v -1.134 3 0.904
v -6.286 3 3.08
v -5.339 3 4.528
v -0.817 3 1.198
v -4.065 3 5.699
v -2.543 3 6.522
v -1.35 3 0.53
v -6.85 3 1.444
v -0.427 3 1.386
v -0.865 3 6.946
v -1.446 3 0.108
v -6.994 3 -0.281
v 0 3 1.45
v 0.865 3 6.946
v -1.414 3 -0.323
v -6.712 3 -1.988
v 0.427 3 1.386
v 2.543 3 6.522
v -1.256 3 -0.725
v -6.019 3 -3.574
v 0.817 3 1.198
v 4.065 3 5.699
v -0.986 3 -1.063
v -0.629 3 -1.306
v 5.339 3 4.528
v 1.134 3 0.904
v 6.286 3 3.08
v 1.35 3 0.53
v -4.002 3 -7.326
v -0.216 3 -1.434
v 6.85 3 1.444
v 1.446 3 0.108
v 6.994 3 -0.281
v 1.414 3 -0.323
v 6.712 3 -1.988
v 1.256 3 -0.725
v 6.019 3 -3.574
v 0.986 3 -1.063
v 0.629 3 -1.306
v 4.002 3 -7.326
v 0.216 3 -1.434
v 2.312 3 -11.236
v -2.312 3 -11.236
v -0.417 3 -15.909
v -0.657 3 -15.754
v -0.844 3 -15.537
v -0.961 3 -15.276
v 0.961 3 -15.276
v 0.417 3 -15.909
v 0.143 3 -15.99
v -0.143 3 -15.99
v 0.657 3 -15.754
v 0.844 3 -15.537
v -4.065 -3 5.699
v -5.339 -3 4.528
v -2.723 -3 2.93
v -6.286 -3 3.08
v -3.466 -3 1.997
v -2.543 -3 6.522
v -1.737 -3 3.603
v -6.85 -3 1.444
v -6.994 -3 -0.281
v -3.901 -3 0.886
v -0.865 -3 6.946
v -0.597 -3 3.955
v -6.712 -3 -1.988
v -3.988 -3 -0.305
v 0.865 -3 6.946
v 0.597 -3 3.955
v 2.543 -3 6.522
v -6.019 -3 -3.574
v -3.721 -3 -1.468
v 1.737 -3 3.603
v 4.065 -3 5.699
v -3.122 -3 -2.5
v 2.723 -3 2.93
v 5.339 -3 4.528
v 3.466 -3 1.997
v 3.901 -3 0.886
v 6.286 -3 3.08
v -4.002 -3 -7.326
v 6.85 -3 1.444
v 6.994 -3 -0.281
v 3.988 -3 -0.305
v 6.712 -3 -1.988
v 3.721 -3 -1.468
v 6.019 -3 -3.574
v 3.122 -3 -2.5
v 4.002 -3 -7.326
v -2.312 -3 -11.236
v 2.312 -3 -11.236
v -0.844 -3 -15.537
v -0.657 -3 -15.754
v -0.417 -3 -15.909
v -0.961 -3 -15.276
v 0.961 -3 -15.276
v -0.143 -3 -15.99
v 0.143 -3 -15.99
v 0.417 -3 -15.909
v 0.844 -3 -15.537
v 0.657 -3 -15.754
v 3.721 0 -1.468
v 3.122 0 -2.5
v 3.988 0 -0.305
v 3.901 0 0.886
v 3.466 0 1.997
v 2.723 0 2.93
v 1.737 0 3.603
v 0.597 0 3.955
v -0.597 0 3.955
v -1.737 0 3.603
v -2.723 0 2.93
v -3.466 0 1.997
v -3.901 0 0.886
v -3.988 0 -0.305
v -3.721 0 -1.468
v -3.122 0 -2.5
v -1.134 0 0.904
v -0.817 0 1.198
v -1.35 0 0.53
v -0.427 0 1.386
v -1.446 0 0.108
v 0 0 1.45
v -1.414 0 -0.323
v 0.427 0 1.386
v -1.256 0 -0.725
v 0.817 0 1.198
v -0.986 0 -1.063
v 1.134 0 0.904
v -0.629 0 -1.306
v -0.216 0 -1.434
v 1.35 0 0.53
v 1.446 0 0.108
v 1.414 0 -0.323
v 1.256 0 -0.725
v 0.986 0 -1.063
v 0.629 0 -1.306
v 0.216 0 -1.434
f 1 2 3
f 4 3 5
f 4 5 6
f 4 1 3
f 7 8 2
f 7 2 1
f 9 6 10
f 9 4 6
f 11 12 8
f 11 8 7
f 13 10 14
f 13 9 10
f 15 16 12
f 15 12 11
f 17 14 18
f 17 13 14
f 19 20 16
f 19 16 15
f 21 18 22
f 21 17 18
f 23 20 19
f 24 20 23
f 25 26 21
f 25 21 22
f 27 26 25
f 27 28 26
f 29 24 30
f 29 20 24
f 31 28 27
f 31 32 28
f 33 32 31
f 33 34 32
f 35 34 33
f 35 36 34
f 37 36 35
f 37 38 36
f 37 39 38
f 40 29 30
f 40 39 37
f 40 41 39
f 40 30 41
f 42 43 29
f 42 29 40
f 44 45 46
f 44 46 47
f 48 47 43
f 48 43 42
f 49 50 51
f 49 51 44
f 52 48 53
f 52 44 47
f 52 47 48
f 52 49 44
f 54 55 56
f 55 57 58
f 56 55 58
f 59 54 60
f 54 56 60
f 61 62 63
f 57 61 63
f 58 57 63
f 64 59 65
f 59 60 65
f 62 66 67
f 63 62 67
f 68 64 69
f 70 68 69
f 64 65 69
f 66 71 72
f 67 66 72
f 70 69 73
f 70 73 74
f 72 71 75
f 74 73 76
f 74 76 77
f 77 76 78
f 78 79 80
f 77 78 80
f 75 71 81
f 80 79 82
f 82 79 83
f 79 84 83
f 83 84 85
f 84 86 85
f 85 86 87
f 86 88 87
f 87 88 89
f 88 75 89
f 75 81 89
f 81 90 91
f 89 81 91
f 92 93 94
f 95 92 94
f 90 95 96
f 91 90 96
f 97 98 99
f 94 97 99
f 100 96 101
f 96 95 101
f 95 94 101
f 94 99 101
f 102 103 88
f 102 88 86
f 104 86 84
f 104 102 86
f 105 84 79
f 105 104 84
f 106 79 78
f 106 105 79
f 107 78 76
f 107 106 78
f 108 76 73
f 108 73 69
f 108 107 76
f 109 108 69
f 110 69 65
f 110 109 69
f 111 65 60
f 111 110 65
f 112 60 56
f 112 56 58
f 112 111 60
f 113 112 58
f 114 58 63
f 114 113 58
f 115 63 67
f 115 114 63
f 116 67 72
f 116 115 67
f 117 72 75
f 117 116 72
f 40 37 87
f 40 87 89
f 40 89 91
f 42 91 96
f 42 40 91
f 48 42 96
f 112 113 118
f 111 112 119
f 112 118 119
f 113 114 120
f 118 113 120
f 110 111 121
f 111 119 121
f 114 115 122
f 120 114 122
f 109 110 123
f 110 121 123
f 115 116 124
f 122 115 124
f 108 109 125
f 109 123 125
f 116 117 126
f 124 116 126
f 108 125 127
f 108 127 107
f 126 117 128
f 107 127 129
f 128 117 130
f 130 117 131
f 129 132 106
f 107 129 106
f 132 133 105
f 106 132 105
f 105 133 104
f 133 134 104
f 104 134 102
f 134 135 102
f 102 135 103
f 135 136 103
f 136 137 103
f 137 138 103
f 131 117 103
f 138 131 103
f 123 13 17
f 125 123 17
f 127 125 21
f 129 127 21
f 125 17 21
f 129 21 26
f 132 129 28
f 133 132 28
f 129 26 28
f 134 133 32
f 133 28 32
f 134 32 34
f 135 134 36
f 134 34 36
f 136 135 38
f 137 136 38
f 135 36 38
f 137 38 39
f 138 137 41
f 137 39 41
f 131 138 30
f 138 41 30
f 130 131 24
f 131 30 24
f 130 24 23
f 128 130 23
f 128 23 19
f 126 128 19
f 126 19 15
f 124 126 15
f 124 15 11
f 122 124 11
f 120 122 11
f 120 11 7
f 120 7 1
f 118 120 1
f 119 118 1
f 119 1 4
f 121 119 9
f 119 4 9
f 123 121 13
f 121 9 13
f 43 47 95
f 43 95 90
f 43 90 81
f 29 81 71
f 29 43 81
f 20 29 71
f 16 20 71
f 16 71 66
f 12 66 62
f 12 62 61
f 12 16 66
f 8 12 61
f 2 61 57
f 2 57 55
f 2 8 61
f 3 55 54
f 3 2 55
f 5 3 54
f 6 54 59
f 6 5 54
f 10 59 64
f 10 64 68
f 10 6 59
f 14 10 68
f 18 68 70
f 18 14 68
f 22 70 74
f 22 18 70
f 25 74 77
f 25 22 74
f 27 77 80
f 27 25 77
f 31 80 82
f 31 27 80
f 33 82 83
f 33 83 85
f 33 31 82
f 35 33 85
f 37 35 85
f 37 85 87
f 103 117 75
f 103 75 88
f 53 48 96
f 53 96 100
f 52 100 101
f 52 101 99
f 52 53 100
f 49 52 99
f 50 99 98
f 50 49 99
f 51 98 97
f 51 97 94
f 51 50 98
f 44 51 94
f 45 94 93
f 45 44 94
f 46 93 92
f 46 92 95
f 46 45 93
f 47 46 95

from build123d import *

# Parameters (mm, degrees)
BOSS_EXTRUDE1_DEPTH = 3
BOSS_EXTRUDE2_START = 3
SKETCH1_3_R         = 1.45
BOSS_EXTRUDE2_DEPTH = 3


with BuildPart() as part:
    # Sketch1 → Boss-Extrude1 (new body)
    with BuildSketch(Plane(origin=(0, 0, 0), x_dir=(1, 0, 0), z_dir=(0, 1, 0))):
        with BuildLine():
            ThreePointArc((-0.961022379, 15.276470588), (-3.11550152, 9.263204593), (-6.019034903, 3.573684211))
            ThreePointArc((-6.019034903, 3.573684211), (0, -7), (6.019034903, 3.573684211))
            ThreePointArc((6.019034903, 3.573684211), (3.11550152, 9.263204593), (0.961022379, 15.276470588))
            ThreePointArc((0.961022379, 15.276470588), (0, 16), (-0.961022379, 15.276470588))
        make_face()
        with BuildLine():
            Line((-3.122498999, 2.5), (3.122498999, 2.5))
            ThreePointArc((3.122498999, 2.5), (0, -4), (-3.122498999, 2.5))
        make_face(mode=Mode.SUBTRACT)
    extrude(amount=-BOSS_EXTRUDE1_DEPTH)

    # Sketch1<3> → Boss-Extrude2 (add)
    with BuildSketch(Plane(origin=(0, 0, 0), x_dir=(1, 0, 0), z_dir=(0, 1, 0)).offset(BOSS_EXTRUDE2_START)):
        with BuildLine():
            ThreePointArc((-0.961022379, 15.276470588), (-3.11550152, 9.263204593), (-6.019034903, 3.573684211))
            ThreePointArc((-6.019034903, 3.573684211), (0, -7), (6.019034903, 3.573684211))
            ThreePointArc((6.019034903, 3.573684211), (3.11550152, 9.263204593), (0.961022379, 15.276470588))
            ThreePointArc((0.961022379, 15.276470588), (0, 16), (-0.961022379, 15.276470588))
        make_face()
        Circle(SKETCH1_3_R, mode=Mode.SUBTRACT)
    extrude(amount=-BOSS_EXTRUDE2_DEPTH)


solid = part.part
